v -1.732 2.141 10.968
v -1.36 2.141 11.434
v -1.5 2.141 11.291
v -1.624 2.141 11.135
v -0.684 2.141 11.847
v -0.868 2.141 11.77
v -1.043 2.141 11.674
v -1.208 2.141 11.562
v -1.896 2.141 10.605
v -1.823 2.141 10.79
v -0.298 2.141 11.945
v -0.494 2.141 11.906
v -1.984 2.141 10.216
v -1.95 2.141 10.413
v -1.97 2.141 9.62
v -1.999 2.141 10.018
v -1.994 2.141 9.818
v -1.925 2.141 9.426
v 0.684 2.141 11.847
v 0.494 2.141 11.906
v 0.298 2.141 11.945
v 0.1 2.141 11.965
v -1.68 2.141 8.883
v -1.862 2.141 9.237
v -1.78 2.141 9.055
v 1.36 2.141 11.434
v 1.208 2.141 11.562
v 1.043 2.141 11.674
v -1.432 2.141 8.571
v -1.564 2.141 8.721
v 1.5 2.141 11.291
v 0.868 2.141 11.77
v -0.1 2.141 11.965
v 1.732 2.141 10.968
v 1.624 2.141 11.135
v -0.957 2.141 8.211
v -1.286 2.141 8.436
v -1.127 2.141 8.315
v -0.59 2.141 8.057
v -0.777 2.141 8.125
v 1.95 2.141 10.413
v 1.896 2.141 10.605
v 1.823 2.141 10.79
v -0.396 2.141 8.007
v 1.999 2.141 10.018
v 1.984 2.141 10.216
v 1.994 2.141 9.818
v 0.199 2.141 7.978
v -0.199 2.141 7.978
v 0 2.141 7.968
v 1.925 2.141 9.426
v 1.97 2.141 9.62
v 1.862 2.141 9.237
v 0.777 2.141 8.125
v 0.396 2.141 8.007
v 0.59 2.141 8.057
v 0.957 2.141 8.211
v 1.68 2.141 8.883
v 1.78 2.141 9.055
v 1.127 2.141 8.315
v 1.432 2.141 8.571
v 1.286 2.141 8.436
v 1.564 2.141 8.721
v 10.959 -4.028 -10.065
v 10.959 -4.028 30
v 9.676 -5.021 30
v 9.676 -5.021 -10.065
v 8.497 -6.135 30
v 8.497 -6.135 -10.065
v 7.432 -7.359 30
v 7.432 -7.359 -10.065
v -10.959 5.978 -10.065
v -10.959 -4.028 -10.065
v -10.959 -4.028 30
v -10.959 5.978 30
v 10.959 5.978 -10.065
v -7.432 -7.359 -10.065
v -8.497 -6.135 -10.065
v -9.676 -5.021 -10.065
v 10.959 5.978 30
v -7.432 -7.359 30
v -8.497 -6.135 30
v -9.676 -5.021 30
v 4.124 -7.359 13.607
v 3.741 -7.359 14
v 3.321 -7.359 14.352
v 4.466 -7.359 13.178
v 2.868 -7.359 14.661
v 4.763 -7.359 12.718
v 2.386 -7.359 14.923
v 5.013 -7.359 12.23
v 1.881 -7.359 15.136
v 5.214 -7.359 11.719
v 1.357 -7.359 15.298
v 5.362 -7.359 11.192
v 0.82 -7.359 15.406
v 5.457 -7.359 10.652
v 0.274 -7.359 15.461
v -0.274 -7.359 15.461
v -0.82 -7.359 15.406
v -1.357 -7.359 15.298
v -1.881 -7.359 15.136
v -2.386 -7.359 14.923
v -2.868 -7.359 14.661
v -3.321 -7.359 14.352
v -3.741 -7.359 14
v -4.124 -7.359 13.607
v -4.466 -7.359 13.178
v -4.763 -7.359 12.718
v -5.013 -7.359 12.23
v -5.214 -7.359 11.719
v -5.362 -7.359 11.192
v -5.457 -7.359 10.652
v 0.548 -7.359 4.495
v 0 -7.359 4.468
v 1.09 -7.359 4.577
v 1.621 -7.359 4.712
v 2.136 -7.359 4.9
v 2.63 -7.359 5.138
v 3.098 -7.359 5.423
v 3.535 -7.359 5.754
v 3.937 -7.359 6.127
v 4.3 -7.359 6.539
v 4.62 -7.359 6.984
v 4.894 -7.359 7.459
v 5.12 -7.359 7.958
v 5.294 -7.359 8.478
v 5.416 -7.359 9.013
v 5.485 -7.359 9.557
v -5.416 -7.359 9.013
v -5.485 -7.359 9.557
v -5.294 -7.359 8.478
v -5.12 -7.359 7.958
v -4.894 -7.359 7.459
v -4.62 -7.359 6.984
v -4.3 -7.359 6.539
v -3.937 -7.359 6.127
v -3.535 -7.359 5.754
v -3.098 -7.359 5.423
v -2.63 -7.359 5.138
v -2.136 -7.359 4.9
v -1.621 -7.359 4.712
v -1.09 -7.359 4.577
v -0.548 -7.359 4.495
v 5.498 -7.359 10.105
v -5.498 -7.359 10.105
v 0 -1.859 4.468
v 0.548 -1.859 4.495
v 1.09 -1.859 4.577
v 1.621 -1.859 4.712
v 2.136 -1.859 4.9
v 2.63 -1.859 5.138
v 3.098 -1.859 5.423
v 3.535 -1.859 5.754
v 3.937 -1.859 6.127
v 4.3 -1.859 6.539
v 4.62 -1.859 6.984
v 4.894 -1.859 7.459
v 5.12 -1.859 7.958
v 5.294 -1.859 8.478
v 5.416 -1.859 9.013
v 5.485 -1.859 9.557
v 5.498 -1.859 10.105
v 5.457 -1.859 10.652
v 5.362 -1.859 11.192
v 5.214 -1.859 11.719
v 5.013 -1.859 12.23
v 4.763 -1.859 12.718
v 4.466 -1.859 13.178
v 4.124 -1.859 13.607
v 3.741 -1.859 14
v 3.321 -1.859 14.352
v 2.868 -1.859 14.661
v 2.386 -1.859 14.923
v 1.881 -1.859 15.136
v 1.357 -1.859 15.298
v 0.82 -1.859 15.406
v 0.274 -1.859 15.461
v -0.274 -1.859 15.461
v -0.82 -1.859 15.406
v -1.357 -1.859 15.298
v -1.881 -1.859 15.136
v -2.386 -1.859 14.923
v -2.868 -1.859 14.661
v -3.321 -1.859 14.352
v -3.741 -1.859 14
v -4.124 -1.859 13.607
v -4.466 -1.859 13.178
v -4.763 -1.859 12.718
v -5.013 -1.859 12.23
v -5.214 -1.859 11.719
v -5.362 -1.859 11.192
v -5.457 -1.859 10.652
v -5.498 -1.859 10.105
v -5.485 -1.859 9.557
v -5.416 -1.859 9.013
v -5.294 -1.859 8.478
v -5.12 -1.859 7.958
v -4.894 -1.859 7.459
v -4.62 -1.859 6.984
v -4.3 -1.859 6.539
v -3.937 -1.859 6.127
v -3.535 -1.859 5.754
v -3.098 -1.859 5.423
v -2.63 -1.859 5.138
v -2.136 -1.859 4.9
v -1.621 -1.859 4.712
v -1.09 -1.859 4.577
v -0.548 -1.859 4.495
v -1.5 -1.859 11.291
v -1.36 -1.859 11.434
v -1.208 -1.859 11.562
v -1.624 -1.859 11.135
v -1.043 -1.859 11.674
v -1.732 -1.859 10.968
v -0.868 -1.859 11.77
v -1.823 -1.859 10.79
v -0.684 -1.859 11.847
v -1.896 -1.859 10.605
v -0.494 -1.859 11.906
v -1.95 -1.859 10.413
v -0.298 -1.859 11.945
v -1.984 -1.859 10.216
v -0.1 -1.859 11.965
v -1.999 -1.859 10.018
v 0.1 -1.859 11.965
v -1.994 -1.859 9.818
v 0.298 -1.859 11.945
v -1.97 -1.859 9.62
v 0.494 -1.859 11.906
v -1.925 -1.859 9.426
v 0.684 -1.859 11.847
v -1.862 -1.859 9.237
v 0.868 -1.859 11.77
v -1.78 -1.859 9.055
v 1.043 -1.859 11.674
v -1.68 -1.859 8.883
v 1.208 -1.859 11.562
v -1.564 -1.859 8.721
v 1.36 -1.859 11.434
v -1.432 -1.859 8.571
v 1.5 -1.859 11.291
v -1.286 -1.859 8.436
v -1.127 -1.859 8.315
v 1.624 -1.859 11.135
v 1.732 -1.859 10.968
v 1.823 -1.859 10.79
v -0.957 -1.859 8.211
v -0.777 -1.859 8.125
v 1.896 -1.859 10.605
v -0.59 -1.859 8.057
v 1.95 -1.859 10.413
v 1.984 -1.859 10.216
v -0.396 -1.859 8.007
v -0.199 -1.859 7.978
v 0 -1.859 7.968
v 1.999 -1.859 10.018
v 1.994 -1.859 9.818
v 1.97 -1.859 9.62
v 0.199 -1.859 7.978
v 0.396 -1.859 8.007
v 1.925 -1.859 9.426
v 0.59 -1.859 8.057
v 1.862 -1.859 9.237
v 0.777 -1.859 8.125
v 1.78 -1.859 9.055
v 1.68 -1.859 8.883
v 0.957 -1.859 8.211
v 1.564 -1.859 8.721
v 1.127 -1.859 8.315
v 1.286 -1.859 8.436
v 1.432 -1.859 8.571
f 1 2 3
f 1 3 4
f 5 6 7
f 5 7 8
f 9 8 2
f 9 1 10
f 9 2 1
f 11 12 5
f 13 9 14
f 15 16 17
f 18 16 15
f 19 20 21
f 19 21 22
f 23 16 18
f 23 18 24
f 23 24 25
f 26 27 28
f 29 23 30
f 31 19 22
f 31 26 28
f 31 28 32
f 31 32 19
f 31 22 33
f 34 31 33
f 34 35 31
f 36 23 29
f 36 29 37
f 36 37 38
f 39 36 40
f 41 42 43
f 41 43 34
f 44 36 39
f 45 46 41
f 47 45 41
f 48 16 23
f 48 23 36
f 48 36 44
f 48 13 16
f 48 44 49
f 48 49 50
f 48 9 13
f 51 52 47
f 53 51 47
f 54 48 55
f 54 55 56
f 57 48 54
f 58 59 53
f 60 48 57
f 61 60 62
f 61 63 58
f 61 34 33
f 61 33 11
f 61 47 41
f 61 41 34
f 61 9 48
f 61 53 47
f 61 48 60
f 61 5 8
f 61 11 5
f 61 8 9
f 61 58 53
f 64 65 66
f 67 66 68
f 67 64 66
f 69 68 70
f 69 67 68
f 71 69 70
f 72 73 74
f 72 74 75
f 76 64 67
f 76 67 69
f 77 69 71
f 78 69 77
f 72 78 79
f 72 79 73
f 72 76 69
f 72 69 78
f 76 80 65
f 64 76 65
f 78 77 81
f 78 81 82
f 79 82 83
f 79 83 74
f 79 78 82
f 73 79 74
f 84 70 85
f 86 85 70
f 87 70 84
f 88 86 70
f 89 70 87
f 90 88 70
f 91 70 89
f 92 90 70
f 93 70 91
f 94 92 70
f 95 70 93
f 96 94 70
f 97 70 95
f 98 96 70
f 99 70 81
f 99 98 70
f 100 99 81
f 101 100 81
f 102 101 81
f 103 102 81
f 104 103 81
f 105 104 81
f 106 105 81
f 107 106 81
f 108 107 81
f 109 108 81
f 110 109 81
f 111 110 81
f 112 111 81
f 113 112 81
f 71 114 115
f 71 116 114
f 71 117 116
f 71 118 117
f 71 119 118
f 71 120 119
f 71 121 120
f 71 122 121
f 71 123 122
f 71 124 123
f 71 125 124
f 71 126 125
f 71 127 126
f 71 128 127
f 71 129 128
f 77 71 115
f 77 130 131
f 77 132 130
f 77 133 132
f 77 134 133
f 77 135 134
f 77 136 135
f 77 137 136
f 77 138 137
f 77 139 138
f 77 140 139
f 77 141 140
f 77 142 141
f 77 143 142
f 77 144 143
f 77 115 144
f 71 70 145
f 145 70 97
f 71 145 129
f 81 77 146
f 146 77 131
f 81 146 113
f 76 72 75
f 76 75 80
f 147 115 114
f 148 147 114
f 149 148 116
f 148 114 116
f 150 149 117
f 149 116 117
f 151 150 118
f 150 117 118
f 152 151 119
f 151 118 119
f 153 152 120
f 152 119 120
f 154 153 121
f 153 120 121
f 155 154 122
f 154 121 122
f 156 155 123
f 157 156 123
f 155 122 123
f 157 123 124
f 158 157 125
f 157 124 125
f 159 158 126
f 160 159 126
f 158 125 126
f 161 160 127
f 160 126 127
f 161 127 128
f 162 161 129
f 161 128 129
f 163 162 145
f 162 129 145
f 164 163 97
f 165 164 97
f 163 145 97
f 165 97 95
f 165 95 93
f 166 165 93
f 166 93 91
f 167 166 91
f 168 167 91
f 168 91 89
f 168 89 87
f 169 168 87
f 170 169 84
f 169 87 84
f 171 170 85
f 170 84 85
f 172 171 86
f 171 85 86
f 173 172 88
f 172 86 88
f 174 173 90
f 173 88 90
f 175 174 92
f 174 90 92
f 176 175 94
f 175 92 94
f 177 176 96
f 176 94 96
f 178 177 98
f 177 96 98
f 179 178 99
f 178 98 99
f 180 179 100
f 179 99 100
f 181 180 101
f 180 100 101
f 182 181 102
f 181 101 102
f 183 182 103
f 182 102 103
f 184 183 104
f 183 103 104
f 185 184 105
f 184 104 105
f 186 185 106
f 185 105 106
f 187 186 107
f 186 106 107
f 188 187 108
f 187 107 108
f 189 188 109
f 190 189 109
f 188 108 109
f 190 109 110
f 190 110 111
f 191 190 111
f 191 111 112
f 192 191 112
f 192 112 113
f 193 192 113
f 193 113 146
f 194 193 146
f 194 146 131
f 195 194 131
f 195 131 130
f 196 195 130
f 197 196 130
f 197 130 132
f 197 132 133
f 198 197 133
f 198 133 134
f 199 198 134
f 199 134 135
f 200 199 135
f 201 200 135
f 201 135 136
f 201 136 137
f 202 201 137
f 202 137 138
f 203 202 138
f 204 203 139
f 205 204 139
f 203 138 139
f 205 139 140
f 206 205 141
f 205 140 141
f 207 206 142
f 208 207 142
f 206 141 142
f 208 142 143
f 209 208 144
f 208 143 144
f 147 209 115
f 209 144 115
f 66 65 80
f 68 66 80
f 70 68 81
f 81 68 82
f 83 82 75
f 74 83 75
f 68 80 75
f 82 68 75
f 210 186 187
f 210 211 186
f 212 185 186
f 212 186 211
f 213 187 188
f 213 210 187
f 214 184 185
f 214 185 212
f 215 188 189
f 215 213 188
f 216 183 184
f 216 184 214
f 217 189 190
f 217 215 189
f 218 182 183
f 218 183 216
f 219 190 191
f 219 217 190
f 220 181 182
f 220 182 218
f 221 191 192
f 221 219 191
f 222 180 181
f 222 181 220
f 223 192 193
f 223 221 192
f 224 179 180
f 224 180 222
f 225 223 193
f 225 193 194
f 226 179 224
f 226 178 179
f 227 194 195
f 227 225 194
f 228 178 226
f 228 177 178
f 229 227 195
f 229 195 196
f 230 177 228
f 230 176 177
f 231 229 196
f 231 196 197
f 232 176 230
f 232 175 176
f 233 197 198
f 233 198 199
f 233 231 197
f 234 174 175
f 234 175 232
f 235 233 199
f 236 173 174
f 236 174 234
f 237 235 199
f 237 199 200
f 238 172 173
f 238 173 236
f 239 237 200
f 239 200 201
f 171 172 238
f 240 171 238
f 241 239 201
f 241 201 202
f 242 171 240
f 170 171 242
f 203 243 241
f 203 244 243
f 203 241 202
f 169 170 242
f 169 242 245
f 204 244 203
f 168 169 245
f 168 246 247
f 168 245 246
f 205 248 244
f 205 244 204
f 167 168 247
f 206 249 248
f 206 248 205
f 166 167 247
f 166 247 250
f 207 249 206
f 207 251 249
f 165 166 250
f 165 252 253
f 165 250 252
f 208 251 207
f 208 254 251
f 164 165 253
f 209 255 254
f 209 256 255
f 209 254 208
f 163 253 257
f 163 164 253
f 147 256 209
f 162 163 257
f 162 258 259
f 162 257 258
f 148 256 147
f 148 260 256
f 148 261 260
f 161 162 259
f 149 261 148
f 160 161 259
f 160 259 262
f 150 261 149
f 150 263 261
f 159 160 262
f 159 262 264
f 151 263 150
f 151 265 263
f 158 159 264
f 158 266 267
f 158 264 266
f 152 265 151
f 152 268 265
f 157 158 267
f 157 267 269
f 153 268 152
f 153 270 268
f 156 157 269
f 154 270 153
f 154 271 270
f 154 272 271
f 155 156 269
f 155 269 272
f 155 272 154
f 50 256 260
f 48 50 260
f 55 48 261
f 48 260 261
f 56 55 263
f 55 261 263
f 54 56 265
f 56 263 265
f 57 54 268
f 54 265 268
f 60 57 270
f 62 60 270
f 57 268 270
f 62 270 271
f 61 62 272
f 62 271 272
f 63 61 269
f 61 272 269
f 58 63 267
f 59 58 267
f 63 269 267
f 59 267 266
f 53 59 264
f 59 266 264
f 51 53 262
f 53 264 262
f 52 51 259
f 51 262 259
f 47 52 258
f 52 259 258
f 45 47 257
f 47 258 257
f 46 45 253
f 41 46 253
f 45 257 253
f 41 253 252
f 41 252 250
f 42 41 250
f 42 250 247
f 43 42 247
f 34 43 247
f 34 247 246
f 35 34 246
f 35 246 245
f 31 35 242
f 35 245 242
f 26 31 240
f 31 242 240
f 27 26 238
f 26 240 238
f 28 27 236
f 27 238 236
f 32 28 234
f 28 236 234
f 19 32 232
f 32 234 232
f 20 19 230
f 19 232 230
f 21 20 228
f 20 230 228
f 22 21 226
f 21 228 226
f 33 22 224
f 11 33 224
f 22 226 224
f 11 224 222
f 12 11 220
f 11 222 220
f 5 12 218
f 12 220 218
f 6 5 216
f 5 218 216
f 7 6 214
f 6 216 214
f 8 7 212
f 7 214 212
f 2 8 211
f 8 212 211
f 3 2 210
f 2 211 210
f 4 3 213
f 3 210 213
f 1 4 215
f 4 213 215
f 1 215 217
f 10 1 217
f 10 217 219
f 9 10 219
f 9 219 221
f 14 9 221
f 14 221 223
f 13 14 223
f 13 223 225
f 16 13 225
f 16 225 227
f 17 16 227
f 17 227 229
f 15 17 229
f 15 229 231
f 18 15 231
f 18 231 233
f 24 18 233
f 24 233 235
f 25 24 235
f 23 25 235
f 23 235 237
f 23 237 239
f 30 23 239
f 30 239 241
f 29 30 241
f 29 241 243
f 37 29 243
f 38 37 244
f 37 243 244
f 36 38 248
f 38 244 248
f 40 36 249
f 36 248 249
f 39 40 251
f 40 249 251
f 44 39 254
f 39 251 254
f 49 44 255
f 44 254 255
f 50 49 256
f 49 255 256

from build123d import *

# Parameters (mm, degrees)
EXTRUDE_START       = -10.064513
EXTRUDE_1_DEPTH     = 40.064513032
SKETCH_2_R          = 5.499999999
CUT_EXTRUDE_2_DEPTH = 5.5
SKETCH_3_R          = 1.999999999
CUT_EXTRUDE_3_DEPTH = 4


with BuildPart() as part:
    # Эскиз1 → Вытянуть1 (new body)
    with BuildSketch(Plane.XY.offset(EXTRUDE_START)):
        with BuildLine():
            Line((-10.958966345, 5.977749985), (10.958966345, 5.977749985))
            Line((10.958966345, 5.977749985), (10.958966345, -4.027821729))
            ThreePointArc((10.958966345, -4.027821729), (9.072657082, -5.563138372), (7.432238503, -7.358796112))
            Line((7.432238503, -7.358796112), (-7.432238503, -7.358796112))
            ThreePointArc((-7.432238503, -7.358796112), (-9.072657082, -5.563138372), (-10.958966345, -4.027821729))
            Line((-10.958966345, -4.027821729), (-10.958966345, 5.977749985))
        make_face()
    extrude(amount=EXTRUDE_1_DEPTH)

    # Эскиз2 → Вытянуть2 (cut)
    with BuildSketch(Plane.XZ.offset(7.358796112)):
        with Locations(Location((0, 9.967743485, 0), (0, 0, 270))):
            Circle(SKETCH_2_R)
    extrude(amount=-CUT_EXTRUDE_2_DEPTH, mode=Mode.SUBTRACT)

    # Эскиз3 → Вытянуть3 (cut)
    with BuildSketch(Plane.XZ.offset(1.858796112)):
        with Locations(Location((0, 9.967743485, 0), (0, 0, 270))):
            Circle(SKETCH_3_R)
    extrude(amount=-CUT_EXTRUDE_3_DEPTH, mode=Mode.SUBTRACT)


solid = part.part
